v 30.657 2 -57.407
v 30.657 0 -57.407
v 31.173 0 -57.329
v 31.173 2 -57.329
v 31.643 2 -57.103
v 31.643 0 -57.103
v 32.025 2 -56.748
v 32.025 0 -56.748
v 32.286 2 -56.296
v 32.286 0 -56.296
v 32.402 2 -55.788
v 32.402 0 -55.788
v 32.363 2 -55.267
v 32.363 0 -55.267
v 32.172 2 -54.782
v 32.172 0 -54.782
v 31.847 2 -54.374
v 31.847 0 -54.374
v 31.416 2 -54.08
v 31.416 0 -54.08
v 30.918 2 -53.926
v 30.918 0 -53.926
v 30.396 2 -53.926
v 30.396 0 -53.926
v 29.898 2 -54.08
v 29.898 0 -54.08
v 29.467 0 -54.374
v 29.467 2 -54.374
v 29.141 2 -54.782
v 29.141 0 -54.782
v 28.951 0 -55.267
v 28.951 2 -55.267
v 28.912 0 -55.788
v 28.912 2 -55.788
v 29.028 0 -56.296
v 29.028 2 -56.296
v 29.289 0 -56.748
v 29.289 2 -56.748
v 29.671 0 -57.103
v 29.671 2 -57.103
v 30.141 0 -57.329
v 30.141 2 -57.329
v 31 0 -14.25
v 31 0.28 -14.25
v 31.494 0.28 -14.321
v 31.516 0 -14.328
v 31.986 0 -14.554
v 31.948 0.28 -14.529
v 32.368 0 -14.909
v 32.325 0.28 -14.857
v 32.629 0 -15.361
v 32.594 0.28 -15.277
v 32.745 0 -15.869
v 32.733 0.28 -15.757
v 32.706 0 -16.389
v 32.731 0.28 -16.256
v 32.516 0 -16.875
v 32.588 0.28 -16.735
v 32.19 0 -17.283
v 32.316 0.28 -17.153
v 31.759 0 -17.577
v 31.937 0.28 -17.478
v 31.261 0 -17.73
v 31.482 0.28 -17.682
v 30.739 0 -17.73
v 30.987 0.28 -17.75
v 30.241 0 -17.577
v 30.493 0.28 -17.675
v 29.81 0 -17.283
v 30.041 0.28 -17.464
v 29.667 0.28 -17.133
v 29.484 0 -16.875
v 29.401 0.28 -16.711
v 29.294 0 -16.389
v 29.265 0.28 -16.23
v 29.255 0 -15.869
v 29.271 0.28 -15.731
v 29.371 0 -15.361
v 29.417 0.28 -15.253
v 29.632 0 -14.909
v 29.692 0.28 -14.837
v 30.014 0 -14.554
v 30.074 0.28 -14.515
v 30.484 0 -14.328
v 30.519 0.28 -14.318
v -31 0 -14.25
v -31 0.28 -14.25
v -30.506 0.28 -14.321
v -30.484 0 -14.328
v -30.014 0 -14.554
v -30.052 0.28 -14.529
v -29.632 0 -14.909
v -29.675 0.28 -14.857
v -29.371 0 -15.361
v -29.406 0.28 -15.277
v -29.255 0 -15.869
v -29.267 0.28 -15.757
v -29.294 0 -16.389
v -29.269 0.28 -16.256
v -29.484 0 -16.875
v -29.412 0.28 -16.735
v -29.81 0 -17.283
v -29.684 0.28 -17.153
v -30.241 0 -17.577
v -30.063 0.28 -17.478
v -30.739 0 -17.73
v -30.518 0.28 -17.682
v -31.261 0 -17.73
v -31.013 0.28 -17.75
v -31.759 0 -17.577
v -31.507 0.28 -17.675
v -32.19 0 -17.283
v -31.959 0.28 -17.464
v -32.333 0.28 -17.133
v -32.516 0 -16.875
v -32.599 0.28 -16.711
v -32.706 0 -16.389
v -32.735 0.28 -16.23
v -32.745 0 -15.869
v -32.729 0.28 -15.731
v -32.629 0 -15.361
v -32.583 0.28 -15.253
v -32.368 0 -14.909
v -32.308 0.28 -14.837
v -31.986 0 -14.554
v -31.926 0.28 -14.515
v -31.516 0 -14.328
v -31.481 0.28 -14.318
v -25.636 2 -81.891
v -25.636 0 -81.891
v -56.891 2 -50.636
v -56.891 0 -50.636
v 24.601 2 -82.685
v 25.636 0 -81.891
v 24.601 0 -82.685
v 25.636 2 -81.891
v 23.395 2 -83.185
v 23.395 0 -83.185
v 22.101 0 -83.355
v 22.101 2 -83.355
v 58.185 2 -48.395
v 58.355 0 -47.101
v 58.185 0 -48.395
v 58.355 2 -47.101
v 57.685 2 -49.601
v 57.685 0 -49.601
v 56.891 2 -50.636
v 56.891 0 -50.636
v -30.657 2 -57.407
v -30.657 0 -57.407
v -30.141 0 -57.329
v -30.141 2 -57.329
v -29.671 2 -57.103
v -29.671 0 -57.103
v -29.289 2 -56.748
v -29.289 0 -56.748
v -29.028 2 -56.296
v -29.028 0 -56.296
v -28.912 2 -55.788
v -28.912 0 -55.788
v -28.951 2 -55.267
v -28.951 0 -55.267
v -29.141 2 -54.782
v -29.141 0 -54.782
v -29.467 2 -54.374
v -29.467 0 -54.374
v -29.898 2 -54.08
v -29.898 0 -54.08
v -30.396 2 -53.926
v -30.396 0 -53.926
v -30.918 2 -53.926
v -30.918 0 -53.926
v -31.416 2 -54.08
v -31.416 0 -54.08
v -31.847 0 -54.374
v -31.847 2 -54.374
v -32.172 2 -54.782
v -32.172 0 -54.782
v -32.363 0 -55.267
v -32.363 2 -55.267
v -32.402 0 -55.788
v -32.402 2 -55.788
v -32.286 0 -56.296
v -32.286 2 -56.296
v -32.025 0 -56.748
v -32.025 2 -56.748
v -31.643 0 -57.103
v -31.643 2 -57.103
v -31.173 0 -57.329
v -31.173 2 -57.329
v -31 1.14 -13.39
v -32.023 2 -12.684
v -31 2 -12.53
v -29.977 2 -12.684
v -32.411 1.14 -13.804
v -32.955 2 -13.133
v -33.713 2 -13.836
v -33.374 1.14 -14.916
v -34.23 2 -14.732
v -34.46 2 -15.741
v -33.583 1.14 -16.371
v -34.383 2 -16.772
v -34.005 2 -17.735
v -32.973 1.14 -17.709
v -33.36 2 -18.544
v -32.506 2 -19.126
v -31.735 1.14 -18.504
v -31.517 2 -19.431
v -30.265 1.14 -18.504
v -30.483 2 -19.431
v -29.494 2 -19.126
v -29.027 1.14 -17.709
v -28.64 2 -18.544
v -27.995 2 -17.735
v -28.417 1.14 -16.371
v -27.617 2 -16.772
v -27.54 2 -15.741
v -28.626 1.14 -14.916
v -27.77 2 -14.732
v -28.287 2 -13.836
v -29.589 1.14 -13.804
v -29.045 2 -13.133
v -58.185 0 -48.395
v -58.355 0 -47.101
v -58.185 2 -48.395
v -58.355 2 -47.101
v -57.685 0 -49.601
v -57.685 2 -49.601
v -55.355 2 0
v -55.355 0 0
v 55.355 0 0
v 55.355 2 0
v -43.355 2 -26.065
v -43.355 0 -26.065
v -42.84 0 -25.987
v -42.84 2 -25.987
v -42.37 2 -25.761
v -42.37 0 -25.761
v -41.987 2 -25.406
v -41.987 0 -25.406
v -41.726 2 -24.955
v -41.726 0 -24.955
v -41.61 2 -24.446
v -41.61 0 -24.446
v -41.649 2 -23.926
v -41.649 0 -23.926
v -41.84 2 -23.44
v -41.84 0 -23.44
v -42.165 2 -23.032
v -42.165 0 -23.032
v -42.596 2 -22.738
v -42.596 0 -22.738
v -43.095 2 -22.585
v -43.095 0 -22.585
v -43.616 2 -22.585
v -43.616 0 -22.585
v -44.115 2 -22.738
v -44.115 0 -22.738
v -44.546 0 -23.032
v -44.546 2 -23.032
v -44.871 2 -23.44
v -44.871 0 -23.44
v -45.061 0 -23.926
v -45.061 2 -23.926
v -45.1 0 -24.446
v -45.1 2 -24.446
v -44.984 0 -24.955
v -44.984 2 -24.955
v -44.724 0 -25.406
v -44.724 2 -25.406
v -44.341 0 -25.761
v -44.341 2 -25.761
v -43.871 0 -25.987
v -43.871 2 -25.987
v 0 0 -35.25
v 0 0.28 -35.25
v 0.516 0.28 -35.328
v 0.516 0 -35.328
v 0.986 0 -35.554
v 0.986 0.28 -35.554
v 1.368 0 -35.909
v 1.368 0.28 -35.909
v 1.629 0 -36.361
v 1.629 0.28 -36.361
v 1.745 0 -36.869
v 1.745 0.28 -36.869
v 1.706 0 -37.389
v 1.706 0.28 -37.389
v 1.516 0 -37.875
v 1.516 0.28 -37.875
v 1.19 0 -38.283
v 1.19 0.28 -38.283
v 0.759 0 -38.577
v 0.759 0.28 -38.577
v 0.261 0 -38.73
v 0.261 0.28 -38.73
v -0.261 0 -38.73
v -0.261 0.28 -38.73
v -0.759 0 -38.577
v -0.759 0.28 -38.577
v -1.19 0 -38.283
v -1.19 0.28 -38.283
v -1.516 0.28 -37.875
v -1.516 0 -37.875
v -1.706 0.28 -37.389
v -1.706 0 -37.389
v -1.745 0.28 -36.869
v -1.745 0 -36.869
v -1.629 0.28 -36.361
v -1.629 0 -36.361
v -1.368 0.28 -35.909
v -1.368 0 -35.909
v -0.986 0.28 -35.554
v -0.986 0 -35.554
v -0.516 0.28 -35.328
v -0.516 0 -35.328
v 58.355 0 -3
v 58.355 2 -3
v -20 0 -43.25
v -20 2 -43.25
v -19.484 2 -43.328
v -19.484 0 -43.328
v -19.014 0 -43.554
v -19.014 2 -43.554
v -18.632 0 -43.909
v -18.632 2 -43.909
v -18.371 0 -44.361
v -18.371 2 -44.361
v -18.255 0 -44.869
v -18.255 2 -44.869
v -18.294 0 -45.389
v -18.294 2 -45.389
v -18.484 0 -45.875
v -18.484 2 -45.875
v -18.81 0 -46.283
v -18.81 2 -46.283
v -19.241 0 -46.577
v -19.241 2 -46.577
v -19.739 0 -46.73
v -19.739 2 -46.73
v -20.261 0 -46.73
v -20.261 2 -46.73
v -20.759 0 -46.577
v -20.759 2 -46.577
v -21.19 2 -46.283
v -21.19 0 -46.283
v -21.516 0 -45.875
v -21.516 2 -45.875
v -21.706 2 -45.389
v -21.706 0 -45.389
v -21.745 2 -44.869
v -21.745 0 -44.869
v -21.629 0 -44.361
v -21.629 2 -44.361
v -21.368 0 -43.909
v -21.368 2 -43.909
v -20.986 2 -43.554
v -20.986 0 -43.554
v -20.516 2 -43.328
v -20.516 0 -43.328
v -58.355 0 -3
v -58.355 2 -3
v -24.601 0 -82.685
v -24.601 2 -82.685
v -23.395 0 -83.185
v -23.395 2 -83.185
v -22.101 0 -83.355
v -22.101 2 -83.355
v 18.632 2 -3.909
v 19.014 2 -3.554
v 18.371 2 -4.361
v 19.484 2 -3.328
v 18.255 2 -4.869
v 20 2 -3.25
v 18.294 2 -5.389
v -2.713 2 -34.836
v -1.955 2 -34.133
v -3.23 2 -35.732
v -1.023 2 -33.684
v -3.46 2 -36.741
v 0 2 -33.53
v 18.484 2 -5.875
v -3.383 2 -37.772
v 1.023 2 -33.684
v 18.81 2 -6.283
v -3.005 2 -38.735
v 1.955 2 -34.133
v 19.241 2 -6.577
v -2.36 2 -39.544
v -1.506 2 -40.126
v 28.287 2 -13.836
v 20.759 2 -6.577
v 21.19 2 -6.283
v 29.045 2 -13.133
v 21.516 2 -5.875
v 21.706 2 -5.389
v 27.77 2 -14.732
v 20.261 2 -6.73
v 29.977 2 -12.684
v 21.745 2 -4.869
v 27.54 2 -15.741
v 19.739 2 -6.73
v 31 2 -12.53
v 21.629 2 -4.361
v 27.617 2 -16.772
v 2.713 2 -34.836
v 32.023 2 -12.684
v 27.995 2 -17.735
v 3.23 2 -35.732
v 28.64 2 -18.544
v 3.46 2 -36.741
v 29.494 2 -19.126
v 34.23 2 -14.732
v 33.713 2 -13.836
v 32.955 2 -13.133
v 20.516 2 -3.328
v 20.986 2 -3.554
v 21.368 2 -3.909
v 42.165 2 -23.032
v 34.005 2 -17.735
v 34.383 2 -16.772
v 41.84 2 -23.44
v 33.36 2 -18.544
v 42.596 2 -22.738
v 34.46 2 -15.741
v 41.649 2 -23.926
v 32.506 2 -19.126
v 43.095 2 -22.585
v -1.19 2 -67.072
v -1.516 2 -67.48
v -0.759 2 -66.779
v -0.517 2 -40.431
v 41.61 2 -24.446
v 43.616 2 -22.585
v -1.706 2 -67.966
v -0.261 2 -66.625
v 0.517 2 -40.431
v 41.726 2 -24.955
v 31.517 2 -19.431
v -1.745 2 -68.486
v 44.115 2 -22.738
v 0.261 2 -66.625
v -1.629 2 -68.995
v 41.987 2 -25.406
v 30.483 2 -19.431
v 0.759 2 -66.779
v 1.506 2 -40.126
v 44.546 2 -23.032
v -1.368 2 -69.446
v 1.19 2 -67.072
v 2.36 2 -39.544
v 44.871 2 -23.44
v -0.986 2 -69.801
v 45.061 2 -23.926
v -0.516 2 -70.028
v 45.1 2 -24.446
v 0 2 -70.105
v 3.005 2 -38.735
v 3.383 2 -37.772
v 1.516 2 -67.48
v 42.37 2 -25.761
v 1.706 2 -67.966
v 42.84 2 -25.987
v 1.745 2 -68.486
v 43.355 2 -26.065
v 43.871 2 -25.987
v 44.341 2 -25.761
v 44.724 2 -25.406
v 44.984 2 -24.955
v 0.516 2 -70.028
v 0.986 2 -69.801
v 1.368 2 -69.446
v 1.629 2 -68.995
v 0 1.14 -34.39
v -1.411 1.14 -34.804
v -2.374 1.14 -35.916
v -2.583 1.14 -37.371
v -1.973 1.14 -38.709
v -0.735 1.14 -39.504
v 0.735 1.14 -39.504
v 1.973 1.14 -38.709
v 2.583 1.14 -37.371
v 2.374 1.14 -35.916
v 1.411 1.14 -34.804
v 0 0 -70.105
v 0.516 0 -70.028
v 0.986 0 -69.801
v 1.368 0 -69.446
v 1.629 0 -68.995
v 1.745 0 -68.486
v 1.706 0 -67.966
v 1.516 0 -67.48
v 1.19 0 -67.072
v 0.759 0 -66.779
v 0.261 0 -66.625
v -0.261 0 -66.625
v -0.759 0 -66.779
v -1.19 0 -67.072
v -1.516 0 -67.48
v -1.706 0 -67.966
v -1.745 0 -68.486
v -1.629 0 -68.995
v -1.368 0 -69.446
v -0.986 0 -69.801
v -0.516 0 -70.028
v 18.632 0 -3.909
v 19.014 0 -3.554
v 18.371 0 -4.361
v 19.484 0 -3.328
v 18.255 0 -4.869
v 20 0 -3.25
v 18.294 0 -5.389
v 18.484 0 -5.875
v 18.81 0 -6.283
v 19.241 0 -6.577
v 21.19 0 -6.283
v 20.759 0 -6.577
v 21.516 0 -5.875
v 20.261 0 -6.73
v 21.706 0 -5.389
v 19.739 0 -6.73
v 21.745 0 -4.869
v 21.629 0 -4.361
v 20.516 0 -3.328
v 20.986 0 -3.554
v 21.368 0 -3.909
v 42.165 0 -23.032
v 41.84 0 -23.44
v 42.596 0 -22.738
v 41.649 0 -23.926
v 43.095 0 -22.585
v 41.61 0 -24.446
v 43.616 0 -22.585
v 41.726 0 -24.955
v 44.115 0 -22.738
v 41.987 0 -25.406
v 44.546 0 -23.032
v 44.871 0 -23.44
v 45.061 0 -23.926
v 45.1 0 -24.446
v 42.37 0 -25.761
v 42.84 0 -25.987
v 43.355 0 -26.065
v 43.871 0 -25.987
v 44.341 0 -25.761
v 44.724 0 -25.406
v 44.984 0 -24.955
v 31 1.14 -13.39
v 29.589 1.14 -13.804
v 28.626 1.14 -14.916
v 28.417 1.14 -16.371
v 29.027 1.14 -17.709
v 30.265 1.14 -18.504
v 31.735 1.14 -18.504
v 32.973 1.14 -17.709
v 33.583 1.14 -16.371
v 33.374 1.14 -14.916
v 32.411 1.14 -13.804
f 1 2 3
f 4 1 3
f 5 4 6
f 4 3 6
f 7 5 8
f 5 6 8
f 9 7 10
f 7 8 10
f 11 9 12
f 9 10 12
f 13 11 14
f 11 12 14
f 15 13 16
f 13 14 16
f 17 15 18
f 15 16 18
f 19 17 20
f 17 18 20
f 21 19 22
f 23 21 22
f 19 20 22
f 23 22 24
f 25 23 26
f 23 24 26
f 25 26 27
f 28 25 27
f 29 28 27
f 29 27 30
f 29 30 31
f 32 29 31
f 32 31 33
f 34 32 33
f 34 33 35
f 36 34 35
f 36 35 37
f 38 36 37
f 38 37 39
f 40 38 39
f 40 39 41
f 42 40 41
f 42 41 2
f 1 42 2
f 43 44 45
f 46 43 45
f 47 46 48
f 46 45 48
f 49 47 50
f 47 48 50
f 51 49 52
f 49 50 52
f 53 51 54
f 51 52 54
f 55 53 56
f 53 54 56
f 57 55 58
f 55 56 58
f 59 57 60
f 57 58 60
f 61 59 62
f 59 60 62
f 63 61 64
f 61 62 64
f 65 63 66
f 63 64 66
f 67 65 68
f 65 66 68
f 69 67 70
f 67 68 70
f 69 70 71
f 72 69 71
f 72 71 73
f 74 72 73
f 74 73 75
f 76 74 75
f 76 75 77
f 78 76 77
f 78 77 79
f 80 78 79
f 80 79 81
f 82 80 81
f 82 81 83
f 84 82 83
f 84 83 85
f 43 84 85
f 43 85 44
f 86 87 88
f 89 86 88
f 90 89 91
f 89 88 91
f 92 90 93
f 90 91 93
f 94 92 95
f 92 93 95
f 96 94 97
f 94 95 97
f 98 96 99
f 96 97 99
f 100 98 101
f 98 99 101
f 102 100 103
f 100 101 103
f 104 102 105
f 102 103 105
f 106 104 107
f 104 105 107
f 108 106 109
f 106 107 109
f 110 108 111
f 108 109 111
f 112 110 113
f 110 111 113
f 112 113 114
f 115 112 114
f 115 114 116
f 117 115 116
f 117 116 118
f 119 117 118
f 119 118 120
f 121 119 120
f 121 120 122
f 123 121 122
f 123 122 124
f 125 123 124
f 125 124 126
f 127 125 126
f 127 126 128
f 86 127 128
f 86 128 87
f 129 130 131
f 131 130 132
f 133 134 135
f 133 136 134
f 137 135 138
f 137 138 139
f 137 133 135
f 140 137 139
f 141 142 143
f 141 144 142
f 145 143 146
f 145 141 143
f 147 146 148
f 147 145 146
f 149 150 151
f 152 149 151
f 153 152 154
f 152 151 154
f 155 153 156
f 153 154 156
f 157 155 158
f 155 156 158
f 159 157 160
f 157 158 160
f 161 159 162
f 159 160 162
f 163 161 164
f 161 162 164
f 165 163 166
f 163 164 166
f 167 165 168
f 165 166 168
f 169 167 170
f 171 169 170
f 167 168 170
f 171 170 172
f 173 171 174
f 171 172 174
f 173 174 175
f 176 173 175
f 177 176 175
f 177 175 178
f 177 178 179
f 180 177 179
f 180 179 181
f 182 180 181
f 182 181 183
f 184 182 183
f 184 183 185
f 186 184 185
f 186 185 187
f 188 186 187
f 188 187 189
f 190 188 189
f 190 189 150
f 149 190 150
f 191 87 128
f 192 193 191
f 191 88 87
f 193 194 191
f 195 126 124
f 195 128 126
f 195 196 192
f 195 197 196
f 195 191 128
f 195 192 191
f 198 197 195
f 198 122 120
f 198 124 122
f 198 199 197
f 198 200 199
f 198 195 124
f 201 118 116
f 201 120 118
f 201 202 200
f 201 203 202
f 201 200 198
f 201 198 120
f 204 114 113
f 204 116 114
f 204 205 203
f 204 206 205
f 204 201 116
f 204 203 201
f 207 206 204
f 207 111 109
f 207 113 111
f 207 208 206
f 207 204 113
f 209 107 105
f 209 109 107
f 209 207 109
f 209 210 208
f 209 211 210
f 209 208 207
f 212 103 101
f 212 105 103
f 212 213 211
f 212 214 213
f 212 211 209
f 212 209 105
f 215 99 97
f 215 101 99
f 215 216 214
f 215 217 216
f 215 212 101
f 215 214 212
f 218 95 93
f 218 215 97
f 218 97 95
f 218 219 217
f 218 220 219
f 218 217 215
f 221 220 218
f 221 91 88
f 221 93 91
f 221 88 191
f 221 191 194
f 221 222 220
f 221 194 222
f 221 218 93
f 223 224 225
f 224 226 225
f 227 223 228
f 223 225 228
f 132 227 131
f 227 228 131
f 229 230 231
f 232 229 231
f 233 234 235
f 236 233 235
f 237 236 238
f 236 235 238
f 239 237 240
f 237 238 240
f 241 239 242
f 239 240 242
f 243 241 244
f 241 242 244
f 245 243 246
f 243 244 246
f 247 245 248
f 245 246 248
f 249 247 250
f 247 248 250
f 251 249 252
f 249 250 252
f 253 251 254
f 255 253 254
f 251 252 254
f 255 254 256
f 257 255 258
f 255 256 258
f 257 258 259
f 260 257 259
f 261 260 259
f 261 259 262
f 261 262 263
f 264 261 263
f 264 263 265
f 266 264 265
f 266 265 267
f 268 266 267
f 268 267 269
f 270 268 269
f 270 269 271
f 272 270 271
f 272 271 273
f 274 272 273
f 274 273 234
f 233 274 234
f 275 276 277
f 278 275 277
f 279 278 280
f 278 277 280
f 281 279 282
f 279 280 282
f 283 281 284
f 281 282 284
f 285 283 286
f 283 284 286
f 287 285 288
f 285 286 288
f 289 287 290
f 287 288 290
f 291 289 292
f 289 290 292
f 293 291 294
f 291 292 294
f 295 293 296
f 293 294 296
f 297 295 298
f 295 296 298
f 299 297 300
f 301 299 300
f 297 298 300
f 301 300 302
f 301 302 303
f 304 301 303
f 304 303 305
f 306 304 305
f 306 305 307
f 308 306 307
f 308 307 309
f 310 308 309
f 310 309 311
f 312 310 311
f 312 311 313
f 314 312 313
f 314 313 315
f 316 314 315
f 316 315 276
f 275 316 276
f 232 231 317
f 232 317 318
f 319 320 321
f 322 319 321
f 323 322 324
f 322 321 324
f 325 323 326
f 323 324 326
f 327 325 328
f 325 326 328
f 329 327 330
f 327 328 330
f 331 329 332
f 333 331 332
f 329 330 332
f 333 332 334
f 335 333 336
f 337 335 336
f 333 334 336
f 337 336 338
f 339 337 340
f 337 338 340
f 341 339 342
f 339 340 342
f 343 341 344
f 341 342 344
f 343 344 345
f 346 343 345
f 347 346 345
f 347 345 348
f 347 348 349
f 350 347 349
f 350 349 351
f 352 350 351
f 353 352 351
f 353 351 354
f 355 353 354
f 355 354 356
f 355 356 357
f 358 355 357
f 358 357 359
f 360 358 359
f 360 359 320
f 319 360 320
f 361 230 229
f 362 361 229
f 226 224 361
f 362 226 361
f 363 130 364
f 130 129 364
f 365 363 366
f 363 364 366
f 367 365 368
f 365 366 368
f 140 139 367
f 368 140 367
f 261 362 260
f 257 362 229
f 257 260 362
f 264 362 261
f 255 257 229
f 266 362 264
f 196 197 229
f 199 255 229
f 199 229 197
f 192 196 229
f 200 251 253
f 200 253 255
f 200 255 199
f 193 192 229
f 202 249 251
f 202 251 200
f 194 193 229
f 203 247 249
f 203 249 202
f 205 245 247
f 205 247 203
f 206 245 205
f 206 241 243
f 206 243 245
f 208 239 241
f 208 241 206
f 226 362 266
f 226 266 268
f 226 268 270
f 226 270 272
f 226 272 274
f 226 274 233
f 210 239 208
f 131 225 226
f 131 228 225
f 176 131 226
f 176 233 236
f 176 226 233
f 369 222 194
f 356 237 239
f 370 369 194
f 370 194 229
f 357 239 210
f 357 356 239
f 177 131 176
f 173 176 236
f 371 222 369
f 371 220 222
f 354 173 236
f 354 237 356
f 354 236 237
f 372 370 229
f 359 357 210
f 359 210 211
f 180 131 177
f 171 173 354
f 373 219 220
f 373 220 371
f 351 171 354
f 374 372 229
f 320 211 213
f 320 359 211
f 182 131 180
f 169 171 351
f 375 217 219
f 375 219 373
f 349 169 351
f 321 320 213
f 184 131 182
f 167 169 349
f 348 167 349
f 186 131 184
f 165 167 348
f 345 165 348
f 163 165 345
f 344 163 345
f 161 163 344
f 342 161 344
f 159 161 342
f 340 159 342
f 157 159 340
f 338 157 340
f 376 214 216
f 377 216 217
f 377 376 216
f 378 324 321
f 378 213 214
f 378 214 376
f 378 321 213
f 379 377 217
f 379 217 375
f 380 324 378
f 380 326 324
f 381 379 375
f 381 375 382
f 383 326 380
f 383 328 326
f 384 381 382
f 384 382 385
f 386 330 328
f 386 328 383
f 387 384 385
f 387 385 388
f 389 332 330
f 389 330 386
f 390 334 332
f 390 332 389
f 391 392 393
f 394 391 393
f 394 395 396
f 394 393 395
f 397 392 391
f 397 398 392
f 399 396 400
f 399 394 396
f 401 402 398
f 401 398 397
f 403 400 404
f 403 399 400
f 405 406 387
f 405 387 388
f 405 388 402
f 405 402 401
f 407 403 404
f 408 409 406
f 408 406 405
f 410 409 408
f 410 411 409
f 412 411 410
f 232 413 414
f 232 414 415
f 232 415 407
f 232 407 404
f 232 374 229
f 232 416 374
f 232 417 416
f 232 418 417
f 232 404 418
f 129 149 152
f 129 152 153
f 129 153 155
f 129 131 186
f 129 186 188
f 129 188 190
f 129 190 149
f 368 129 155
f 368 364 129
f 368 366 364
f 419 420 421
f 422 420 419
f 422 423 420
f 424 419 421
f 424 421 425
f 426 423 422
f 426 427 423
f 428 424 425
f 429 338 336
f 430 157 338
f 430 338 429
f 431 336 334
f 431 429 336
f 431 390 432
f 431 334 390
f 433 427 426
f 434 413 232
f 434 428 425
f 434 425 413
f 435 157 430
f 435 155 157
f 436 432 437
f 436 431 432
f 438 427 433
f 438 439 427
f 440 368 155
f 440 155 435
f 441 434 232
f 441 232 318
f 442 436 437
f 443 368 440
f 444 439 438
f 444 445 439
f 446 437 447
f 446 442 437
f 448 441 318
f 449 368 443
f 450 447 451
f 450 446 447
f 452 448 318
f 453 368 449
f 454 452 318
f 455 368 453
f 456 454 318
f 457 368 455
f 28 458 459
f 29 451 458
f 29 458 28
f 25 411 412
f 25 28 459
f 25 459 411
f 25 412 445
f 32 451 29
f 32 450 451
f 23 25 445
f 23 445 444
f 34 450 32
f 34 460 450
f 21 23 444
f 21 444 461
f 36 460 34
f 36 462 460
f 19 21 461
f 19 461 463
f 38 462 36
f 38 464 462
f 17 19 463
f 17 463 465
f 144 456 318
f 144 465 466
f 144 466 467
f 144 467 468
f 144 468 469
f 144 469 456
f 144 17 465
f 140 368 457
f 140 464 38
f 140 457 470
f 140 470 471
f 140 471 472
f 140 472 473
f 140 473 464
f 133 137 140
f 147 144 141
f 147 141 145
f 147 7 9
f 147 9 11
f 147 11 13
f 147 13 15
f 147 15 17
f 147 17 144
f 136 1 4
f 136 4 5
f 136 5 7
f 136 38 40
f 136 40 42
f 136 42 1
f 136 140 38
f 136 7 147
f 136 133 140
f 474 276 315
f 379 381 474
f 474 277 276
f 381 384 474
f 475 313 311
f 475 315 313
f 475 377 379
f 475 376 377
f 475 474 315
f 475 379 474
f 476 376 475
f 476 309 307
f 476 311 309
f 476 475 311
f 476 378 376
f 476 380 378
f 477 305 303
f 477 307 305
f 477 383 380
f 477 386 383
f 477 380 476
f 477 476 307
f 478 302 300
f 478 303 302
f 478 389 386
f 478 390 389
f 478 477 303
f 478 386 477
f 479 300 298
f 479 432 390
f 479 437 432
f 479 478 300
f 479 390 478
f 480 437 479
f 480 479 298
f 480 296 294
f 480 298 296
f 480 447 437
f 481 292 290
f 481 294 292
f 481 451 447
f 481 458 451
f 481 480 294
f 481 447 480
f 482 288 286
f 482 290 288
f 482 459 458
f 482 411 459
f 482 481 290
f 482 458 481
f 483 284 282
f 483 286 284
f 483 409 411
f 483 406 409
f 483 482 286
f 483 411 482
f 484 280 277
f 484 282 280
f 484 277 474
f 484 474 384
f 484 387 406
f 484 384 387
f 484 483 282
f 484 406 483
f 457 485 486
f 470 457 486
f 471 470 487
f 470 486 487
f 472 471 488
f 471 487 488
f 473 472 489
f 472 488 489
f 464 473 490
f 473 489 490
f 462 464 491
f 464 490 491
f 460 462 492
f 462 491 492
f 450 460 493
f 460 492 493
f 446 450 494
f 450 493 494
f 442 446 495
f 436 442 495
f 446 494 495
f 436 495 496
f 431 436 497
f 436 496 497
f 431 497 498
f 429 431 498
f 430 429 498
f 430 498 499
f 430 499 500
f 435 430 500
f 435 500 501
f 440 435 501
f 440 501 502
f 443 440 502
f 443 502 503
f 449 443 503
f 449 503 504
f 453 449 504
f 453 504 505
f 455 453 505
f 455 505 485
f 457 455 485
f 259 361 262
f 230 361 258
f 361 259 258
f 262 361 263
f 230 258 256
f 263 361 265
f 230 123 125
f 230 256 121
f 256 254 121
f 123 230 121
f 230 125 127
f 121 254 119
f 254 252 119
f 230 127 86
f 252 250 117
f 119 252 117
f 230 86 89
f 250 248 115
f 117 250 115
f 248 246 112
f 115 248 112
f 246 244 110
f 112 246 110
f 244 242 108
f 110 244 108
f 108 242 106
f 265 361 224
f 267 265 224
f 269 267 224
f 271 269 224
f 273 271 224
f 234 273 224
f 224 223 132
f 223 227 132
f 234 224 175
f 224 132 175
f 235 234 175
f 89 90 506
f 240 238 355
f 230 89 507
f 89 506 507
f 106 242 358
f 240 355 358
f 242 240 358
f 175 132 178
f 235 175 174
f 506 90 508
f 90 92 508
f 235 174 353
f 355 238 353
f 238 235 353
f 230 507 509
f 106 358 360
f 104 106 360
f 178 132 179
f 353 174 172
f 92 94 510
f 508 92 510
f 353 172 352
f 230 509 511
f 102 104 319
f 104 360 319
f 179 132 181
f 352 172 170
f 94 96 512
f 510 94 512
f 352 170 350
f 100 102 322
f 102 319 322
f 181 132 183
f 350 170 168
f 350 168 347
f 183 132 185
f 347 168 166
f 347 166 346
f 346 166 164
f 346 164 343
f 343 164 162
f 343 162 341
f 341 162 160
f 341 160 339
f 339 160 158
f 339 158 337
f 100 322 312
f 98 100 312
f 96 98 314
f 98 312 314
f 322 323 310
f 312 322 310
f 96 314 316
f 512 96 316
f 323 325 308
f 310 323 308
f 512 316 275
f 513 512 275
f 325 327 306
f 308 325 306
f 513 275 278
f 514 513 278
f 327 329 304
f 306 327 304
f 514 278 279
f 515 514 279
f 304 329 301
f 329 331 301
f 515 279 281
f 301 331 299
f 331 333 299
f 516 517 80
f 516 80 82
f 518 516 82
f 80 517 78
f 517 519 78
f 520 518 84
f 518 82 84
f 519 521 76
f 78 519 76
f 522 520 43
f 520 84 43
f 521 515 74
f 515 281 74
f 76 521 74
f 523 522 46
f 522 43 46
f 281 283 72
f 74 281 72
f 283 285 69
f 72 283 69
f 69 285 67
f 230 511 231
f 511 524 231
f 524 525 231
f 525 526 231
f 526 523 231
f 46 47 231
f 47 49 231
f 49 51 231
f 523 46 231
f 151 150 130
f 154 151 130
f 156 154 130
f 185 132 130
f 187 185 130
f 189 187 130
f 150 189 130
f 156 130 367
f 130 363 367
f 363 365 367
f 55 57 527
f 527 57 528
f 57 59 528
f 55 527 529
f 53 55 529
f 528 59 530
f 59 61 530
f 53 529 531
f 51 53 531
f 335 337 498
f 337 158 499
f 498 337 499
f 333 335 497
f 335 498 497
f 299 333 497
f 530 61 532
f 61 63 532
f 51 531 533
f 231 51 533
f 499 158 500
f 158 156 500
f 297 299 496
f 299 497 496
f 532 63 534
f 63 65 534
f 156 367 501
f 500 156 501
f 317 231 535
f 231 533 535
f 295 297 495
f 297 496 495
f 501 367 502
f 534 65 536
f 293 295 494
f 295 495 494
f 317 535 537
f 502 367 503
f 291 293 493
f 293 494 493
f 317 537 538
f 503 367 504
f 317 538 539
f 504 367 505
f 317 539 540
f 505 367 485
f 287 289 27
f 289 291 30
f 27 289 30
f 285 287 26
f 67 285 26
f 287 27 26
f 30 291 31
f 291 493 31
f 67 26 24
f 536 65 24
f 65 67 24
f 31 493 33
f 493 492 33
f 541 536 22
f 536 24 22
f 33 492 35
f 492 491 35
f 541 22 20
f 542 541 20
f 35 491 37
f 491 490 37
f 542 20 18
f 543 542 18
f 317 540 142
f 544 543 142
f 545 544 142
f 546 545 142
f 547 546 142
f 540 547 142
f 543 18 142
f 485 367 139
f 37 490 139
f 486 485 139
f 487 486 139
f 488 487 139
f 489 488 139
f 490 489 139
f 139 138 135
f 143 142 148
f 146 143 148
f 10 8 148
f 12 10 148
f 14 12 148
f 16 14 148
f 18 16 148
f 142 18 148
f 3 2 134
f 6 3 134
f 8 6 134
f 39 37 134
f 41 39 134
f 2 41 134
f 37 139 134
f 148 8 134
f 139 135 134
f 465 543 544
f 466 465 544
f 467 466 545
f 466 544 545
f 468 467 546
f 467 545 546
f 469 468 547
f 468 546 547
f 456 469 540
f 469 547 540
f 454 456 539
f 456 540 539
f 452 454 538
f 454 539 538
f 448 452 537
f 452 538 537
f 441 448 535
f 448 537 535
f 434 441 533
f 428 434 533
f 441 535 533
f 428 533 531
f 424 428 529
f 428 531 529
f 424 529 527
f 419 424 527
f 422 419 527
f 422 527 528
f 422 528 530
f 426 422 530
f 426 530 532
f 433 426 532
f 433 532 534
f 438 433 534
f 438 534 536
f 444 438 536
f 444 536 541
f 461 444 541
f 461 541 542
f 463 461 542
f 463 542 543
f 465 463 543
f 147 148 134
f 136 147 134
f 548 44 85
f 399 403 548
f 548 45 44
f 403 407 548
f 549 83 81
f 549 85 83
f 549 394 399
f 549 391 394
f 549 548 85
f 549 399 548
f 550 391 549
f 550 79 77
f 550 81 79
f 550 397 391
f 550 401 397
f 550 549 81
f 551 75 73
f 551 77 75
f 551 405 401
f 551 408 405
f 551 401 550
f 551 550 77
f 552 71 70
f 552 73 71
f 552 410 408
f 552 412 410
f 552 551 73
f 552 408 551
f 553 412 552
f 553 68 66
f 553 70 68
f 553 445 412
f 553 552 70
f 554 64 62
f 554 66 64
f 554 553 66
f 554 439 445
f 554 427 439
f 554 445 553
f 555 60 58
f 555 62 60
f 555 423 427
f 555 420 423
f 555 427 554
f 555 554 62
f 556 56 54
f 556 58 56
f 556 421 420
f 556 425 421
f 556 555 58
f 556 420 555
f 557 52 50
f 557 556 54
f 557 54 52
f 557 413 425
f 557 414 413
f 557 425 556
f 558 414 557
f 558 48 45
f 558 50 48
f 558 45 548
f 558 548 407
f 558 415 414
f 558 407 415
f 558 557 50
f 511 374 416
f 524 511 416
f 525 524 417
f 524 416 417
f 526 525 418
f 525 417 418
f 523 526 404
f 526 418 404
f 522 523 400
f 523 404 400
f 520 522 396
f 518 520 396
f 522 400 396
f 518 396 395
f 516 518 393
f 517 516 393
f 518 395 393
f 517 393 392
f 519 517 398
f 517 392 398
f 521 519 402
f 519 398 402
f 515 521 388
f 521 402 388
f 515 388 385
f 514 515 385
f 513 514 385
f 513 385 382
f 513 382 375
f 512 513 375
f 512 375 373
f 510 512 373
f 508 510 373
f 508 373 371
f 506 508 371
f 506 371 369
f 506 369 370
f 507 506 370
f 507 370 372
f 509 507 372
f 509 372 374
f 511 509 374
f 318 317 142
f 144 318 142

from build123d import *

# Parameters (mm, degrees)
BOSS_EXTRUDE1_DEPTH                          = 2
CUT_EXTRUDE1_REACH                           = 103.772
SKETCH3_R                                    = 1.75
CHAMFER1_SIZE                                = 3
FILLET1_R                                    = 5
CUT_EXTRUDE2_REACH                           = 103.772
SKETCH4_R                                    = 1.75
CUT_EXTRUDE3_REACH                           = 103.772
SKETCH5_R                                    = 1.75
CSK_FOR_M3_HEX_SOCKET_COUNTERSUNK_HE_2_COUNT = 2
CSK_FOR_M3_HEX_SOCKET_COUNTERSUNK_HE_2_PITCH = 37.443290454
CSK_FOR_M3_HEX_SOCKET_COUNTERSUNK_HE_3_COUNT = 2
CSK_FOR_M3_HEX_SOCKET_COUNTERSUNK_HE_3_PITCH = 37.443290454


with BuildPart() as part:
    # Sketch2 → Boss-Extrude1 (new body)
    with BuildSketch(Plane(origin=(0, 0, 0), x_dir=(1, 0, 0), z_dir=(0, 1, 0))):
        Polygon((-58.355339059, 0), (58.355339059, 0), (58.355339059, 49.171572875), (24.171572875, 83.355339059), (-24.171572875, 83.355339059), (-58.355339059, 49.171572875), align=None)
    extrude(amount=BOSS_EXTRUDE1_DEPTH)

    # Sketch3 → Cut-Extrude1 (cut, up to next)
    with BuildSketch(Plane.XZ, mode=Mode.PRIVATE) as cut_extrude1_sk1:
        with Locations(Location((-43.355339059, -24.315188388, 0), (0, 0, 270))):
            Circle(SKETCH3_R)
    cut_extrude1_tool1 = extrude(cut_extrude1_sk1.sketch, amount=-CUT_EXTRUDE1_REACH, mode=Mode.PRIVATE) & part.part
    # Sketch3 → Cut-Extrude1 (cut, up to next)
    with BuildSketch(Plane.XZ, mode=Mode.PRIVATE) as cut_extrude1_sk2:
        with Locations(Location((-30.656854249, -55.656854249, 0), (0, 0, 270))):
            Circle(SKETCH3_R)
    cut_extrude1_tool2 = extrude(cut_extrude1_sk2.sketch, amount=-CUT_EXTRUDE1_REACH, mode=Mode.PRIVATE) & part.part
    # Sketch3 → Cut-Extrude1 (cut, up to next)
    with BuildSketch(Plane.XZ, mode=Mode.PRIVATE) as cut_extrude1_sk3:
        with Locations(Location((0, -68.355339059, 0), (0, 0, 270))):
            Circle(SKETCH3_R)
    cut_extrude1_tool3 = extrude(cut_extrude1_sk3.sketch, amount=-CUT_EXTRUDE1_REACH, mode=Mode.PRIVATE) & part.part
    # Sketch3 → Cut-Extrude1 (cut, up to next)
    with BuildSketch(Plane.XZ, mode=Mode.PRIVATE) as cut_extrude1_sk4:
        with Locations(Location((30.656854249, -55.656854249, 0), (0, 0, 270))):
            Circle(SKETCH3_R)
    cut_extrude1_tool4 = extrude(cut_extrude1_sk4.sketch, amount=-CUT_EXTRUDE1_REACH, mode=Mode.PRIVATE) & part.part
    # Sketch3 → Cut-Extrude1 (cut, up to next)
    with BuildSketch(Plane.XZ, mode=Mode.PRIVATE) as cut_extrude1_sk5:
        with Locations(Location((43.355339059, -24.315188388, 0), (0, 0, 270))):
            Circle(SKETCH3_R)
    cut_extrude1_tool5 = extrude(cut_extrude1_sk5.sketch, amount=-CUT_EXTRUDE1_REACH, mode=Mode.PRIVATE) & part.part
    add(cut_extrude1_tool1.solids().sort_by_distance((-43.355339, 0, -24.315188))[0], mode=Mode.SUBTRACT)
    add(cut_extrude1_tool2.solids().sort_by_distance((-30.656854, 0, -55.656854))[0], mode=Mode.SUBTRACT)
    add(cut_extrude1_tool3.solids().sort_by_distance((0, 0, -68.355339))[0], mode=Mode.SUBTRACT)
    add(cut_extrude1_tool4.solids().sort_by_distance((30.656854, 0, -55.656854))[0], mode=Mode.SUBTRACT)
    add(cut_extrude1_tool5.solids().sort_by_distance((43.355339, 0, -24.315188))[0], mode=Mode.SUBTRACT)

    # Chamfer1
    chamfer1_edges = [part.edges().sort_by_distance(p)[0] for p in [
        (58.355339059, 1, 0),
        (-58.355339059, 1, 0),
    ]]
    chamfer(chamfer1_edges, length=CHAMFER1_SIZE)

    # Fillet1
    fillet1_edges = [part.edges().sort_by_distance(p)[0] for p in [
        (-58.355339059, 1, -49.171572875),
        (-24.171572875, 1, -83.355339059),
        (24.171572875, 1, -83.355339059),
        (58.355339059, 1, -49.171572875),
    ]]
    fillet(fillet1_edges, radius=FILLET1_R)

    # Sketch4 → Cut-Extrude2 (cut, up to next)
    with BuildSketch(Plane(origin=(0, 2, 0), x_dir=(1, 0, 0), z_dir=(0, 1, 0)), mode=Mode.PRIVATE) as cut_extrude2_sk1:
        with Locations(Location((-20, 45, 0), (0, 0, 270))):
            Circle(SKETCH4_R)
    cut_extrude2_tool1 = extrude(cut_extrude2_sk1.sketch, amount=-CUT_EXTRUDE2_REACH, mode=Mode.PRIVATE) & part.part
    # Sketch4 → Cut-Extrude2 (cut, up to next)
    with BuildSketch(Plane(origin=(0, 2, 0), x_dir=(1, 0, 0), z_dir=(0, 1, 0)), mode=Mode.PRIVATE) as cut_extrude2_sk2:
        with Locations(Location((20, 5, 0), (0, 0, 270))):
            Circle(SKETCH4_R)
    cut_extrude2_tool2 = extrude(cut_extrude2_sk2.sketch, amount=-CUT_EXTRUDE2_REACH, mode=Mode.PRIVATE) & part.part
    add(cut_extrude2_tool1.solids().sort_by_distance((-20, 2, -45))[0], mode=Mode.SUBTRACT)
    add(cut_extrude2_tool2.solids().sort_by_distance((20, 2, -5))[0], mode=Mode.SUBTRACT)

    # Sketch5 → Cut-Extrude3 (cut, up to next)
    with BuildSketch(Plane(origin=(0, 2, 0), x_dir=(1, 0, 0), z_dir=(0, 1, 0)), mode=Mode.PRIVATE) as cut_extrude3_sk1:
        with Locations(Location((0, 37, 0), (0, 0, 270))):
            Circle(SKETCH5_R)
    cut_extrude3_tool1 = extrude(cut_extrude3_sk1.sketch, amount=-CUT_EXTRUDE3_REACH, mode=Mode.PRIVATE) & part.part
    # Sketch5 → Cut-Extrude3 (cut, up to next)
    with BuildSketch(Plane(origin=(0, 2, 0), x_dir=(1, 0, 0), z_dir=(0, 1, 0)), mode=Mode.PRIVATE) as cut_extrude3_sk2:
        with Locations(Location((-31, 16, 0), (0, 0, 270))):
            Circle(SKETCH5_R)
    cut_extrude3_tool2 = extrude(cut_extrude3_sk2.sketch, amount=-CUT_EXTRUDE3_REACH, mode=Mode.PRIVATE) & part.part
    # Sketch5 → Cut-Extrude3 (cut, up to next)
    with BuildSketch(Plane(origin=(0, 2, 0), x_dir=(1, 0, 0), z_dir=(0, 1, 0)), mode=Mode.PRIVATE) as cut_extrude3_sk3:
        with Locations(Location((31, 16, 0), (0, 0, 270))):
            Circle(SKETCH5_R)
    cut_extrude3_tool3 = extrude(cut_extrude3_sk3.sketch, amount=-CUT_EXTRUDE3_REACH, mode=Mode.PRIVATE) & part.part
    add(cut_extrude3_tool1.solids().sort_by_distance((0, 2, -37))[0], mode=Mode.SUBTRACT)
    add(cut_extrude3_tool2.solids().sort_by_distance((-31, 2, -16))[0], mode=Mode.SUBTRACT)
    add(cut_extrude3_tool3.solids().sort_by_distance((31, 2, -16))[0], mode=Mode.SUBTRACT)

    # Sketch6 → CSK for M3 Hex Socket Countersunk Head Screw1 (revolve, cut)
    with BuildSketch(Plane(origin=(0, 2, -37), x_dir=(0, 0, 1), z_dir=(1, 0, 0))):
        Polygon((0, 0), (0, 2), (1.7, 2), (1.7, 1.77), (3.47, 0), align=None)
    csk_for_m3_hex_socket_countersunk_head_s = revolve(axis=Axis((0, 8.35, -37), (0, -1, 0)), mode=Mode.SUBTRACT)

    # CSK for M3 Hex Socket Countersunk He 2: CSK for M3 Hex Socket Countersunk Head Screw1 ×2
    with Locations(*[Vector(-0.827918690488332, 0, 0.5608481451695153) * (i * CSK_FOR_M3_HEX_SOCKET_COUNTERSUNK_HE_2_PITCH) for i in range(1, CSK_FOR_M3_HEX_SOCKET_COUNTERSUNK_HE_2_COUNT)]):
        add(csk_for_m3_hex_socket_countersunk_head_s, mode=Mode.SUBTRACT)

    # CSK for M3 Hex Socket Countersunk He 3: CSK for M3 Hex Socket Countersunk Head Screw1 ×2
    with Locations(*[Vector(0.827918690488332, 0, 0.5608481451695153) * (i * CSK_FOR_M3_HEX_SOCKET_COUNTERSUNK_HE_3_PITCH) for i in range(1, CSK_FOR_M3_HEX_SOCKET_COUNTERSUNK_HE_3_COUNT)]):
        add(csk_for_m3_hex_socket_countersunk_head_s, mode=Mode.SUBTRACT)


solid = part.part
